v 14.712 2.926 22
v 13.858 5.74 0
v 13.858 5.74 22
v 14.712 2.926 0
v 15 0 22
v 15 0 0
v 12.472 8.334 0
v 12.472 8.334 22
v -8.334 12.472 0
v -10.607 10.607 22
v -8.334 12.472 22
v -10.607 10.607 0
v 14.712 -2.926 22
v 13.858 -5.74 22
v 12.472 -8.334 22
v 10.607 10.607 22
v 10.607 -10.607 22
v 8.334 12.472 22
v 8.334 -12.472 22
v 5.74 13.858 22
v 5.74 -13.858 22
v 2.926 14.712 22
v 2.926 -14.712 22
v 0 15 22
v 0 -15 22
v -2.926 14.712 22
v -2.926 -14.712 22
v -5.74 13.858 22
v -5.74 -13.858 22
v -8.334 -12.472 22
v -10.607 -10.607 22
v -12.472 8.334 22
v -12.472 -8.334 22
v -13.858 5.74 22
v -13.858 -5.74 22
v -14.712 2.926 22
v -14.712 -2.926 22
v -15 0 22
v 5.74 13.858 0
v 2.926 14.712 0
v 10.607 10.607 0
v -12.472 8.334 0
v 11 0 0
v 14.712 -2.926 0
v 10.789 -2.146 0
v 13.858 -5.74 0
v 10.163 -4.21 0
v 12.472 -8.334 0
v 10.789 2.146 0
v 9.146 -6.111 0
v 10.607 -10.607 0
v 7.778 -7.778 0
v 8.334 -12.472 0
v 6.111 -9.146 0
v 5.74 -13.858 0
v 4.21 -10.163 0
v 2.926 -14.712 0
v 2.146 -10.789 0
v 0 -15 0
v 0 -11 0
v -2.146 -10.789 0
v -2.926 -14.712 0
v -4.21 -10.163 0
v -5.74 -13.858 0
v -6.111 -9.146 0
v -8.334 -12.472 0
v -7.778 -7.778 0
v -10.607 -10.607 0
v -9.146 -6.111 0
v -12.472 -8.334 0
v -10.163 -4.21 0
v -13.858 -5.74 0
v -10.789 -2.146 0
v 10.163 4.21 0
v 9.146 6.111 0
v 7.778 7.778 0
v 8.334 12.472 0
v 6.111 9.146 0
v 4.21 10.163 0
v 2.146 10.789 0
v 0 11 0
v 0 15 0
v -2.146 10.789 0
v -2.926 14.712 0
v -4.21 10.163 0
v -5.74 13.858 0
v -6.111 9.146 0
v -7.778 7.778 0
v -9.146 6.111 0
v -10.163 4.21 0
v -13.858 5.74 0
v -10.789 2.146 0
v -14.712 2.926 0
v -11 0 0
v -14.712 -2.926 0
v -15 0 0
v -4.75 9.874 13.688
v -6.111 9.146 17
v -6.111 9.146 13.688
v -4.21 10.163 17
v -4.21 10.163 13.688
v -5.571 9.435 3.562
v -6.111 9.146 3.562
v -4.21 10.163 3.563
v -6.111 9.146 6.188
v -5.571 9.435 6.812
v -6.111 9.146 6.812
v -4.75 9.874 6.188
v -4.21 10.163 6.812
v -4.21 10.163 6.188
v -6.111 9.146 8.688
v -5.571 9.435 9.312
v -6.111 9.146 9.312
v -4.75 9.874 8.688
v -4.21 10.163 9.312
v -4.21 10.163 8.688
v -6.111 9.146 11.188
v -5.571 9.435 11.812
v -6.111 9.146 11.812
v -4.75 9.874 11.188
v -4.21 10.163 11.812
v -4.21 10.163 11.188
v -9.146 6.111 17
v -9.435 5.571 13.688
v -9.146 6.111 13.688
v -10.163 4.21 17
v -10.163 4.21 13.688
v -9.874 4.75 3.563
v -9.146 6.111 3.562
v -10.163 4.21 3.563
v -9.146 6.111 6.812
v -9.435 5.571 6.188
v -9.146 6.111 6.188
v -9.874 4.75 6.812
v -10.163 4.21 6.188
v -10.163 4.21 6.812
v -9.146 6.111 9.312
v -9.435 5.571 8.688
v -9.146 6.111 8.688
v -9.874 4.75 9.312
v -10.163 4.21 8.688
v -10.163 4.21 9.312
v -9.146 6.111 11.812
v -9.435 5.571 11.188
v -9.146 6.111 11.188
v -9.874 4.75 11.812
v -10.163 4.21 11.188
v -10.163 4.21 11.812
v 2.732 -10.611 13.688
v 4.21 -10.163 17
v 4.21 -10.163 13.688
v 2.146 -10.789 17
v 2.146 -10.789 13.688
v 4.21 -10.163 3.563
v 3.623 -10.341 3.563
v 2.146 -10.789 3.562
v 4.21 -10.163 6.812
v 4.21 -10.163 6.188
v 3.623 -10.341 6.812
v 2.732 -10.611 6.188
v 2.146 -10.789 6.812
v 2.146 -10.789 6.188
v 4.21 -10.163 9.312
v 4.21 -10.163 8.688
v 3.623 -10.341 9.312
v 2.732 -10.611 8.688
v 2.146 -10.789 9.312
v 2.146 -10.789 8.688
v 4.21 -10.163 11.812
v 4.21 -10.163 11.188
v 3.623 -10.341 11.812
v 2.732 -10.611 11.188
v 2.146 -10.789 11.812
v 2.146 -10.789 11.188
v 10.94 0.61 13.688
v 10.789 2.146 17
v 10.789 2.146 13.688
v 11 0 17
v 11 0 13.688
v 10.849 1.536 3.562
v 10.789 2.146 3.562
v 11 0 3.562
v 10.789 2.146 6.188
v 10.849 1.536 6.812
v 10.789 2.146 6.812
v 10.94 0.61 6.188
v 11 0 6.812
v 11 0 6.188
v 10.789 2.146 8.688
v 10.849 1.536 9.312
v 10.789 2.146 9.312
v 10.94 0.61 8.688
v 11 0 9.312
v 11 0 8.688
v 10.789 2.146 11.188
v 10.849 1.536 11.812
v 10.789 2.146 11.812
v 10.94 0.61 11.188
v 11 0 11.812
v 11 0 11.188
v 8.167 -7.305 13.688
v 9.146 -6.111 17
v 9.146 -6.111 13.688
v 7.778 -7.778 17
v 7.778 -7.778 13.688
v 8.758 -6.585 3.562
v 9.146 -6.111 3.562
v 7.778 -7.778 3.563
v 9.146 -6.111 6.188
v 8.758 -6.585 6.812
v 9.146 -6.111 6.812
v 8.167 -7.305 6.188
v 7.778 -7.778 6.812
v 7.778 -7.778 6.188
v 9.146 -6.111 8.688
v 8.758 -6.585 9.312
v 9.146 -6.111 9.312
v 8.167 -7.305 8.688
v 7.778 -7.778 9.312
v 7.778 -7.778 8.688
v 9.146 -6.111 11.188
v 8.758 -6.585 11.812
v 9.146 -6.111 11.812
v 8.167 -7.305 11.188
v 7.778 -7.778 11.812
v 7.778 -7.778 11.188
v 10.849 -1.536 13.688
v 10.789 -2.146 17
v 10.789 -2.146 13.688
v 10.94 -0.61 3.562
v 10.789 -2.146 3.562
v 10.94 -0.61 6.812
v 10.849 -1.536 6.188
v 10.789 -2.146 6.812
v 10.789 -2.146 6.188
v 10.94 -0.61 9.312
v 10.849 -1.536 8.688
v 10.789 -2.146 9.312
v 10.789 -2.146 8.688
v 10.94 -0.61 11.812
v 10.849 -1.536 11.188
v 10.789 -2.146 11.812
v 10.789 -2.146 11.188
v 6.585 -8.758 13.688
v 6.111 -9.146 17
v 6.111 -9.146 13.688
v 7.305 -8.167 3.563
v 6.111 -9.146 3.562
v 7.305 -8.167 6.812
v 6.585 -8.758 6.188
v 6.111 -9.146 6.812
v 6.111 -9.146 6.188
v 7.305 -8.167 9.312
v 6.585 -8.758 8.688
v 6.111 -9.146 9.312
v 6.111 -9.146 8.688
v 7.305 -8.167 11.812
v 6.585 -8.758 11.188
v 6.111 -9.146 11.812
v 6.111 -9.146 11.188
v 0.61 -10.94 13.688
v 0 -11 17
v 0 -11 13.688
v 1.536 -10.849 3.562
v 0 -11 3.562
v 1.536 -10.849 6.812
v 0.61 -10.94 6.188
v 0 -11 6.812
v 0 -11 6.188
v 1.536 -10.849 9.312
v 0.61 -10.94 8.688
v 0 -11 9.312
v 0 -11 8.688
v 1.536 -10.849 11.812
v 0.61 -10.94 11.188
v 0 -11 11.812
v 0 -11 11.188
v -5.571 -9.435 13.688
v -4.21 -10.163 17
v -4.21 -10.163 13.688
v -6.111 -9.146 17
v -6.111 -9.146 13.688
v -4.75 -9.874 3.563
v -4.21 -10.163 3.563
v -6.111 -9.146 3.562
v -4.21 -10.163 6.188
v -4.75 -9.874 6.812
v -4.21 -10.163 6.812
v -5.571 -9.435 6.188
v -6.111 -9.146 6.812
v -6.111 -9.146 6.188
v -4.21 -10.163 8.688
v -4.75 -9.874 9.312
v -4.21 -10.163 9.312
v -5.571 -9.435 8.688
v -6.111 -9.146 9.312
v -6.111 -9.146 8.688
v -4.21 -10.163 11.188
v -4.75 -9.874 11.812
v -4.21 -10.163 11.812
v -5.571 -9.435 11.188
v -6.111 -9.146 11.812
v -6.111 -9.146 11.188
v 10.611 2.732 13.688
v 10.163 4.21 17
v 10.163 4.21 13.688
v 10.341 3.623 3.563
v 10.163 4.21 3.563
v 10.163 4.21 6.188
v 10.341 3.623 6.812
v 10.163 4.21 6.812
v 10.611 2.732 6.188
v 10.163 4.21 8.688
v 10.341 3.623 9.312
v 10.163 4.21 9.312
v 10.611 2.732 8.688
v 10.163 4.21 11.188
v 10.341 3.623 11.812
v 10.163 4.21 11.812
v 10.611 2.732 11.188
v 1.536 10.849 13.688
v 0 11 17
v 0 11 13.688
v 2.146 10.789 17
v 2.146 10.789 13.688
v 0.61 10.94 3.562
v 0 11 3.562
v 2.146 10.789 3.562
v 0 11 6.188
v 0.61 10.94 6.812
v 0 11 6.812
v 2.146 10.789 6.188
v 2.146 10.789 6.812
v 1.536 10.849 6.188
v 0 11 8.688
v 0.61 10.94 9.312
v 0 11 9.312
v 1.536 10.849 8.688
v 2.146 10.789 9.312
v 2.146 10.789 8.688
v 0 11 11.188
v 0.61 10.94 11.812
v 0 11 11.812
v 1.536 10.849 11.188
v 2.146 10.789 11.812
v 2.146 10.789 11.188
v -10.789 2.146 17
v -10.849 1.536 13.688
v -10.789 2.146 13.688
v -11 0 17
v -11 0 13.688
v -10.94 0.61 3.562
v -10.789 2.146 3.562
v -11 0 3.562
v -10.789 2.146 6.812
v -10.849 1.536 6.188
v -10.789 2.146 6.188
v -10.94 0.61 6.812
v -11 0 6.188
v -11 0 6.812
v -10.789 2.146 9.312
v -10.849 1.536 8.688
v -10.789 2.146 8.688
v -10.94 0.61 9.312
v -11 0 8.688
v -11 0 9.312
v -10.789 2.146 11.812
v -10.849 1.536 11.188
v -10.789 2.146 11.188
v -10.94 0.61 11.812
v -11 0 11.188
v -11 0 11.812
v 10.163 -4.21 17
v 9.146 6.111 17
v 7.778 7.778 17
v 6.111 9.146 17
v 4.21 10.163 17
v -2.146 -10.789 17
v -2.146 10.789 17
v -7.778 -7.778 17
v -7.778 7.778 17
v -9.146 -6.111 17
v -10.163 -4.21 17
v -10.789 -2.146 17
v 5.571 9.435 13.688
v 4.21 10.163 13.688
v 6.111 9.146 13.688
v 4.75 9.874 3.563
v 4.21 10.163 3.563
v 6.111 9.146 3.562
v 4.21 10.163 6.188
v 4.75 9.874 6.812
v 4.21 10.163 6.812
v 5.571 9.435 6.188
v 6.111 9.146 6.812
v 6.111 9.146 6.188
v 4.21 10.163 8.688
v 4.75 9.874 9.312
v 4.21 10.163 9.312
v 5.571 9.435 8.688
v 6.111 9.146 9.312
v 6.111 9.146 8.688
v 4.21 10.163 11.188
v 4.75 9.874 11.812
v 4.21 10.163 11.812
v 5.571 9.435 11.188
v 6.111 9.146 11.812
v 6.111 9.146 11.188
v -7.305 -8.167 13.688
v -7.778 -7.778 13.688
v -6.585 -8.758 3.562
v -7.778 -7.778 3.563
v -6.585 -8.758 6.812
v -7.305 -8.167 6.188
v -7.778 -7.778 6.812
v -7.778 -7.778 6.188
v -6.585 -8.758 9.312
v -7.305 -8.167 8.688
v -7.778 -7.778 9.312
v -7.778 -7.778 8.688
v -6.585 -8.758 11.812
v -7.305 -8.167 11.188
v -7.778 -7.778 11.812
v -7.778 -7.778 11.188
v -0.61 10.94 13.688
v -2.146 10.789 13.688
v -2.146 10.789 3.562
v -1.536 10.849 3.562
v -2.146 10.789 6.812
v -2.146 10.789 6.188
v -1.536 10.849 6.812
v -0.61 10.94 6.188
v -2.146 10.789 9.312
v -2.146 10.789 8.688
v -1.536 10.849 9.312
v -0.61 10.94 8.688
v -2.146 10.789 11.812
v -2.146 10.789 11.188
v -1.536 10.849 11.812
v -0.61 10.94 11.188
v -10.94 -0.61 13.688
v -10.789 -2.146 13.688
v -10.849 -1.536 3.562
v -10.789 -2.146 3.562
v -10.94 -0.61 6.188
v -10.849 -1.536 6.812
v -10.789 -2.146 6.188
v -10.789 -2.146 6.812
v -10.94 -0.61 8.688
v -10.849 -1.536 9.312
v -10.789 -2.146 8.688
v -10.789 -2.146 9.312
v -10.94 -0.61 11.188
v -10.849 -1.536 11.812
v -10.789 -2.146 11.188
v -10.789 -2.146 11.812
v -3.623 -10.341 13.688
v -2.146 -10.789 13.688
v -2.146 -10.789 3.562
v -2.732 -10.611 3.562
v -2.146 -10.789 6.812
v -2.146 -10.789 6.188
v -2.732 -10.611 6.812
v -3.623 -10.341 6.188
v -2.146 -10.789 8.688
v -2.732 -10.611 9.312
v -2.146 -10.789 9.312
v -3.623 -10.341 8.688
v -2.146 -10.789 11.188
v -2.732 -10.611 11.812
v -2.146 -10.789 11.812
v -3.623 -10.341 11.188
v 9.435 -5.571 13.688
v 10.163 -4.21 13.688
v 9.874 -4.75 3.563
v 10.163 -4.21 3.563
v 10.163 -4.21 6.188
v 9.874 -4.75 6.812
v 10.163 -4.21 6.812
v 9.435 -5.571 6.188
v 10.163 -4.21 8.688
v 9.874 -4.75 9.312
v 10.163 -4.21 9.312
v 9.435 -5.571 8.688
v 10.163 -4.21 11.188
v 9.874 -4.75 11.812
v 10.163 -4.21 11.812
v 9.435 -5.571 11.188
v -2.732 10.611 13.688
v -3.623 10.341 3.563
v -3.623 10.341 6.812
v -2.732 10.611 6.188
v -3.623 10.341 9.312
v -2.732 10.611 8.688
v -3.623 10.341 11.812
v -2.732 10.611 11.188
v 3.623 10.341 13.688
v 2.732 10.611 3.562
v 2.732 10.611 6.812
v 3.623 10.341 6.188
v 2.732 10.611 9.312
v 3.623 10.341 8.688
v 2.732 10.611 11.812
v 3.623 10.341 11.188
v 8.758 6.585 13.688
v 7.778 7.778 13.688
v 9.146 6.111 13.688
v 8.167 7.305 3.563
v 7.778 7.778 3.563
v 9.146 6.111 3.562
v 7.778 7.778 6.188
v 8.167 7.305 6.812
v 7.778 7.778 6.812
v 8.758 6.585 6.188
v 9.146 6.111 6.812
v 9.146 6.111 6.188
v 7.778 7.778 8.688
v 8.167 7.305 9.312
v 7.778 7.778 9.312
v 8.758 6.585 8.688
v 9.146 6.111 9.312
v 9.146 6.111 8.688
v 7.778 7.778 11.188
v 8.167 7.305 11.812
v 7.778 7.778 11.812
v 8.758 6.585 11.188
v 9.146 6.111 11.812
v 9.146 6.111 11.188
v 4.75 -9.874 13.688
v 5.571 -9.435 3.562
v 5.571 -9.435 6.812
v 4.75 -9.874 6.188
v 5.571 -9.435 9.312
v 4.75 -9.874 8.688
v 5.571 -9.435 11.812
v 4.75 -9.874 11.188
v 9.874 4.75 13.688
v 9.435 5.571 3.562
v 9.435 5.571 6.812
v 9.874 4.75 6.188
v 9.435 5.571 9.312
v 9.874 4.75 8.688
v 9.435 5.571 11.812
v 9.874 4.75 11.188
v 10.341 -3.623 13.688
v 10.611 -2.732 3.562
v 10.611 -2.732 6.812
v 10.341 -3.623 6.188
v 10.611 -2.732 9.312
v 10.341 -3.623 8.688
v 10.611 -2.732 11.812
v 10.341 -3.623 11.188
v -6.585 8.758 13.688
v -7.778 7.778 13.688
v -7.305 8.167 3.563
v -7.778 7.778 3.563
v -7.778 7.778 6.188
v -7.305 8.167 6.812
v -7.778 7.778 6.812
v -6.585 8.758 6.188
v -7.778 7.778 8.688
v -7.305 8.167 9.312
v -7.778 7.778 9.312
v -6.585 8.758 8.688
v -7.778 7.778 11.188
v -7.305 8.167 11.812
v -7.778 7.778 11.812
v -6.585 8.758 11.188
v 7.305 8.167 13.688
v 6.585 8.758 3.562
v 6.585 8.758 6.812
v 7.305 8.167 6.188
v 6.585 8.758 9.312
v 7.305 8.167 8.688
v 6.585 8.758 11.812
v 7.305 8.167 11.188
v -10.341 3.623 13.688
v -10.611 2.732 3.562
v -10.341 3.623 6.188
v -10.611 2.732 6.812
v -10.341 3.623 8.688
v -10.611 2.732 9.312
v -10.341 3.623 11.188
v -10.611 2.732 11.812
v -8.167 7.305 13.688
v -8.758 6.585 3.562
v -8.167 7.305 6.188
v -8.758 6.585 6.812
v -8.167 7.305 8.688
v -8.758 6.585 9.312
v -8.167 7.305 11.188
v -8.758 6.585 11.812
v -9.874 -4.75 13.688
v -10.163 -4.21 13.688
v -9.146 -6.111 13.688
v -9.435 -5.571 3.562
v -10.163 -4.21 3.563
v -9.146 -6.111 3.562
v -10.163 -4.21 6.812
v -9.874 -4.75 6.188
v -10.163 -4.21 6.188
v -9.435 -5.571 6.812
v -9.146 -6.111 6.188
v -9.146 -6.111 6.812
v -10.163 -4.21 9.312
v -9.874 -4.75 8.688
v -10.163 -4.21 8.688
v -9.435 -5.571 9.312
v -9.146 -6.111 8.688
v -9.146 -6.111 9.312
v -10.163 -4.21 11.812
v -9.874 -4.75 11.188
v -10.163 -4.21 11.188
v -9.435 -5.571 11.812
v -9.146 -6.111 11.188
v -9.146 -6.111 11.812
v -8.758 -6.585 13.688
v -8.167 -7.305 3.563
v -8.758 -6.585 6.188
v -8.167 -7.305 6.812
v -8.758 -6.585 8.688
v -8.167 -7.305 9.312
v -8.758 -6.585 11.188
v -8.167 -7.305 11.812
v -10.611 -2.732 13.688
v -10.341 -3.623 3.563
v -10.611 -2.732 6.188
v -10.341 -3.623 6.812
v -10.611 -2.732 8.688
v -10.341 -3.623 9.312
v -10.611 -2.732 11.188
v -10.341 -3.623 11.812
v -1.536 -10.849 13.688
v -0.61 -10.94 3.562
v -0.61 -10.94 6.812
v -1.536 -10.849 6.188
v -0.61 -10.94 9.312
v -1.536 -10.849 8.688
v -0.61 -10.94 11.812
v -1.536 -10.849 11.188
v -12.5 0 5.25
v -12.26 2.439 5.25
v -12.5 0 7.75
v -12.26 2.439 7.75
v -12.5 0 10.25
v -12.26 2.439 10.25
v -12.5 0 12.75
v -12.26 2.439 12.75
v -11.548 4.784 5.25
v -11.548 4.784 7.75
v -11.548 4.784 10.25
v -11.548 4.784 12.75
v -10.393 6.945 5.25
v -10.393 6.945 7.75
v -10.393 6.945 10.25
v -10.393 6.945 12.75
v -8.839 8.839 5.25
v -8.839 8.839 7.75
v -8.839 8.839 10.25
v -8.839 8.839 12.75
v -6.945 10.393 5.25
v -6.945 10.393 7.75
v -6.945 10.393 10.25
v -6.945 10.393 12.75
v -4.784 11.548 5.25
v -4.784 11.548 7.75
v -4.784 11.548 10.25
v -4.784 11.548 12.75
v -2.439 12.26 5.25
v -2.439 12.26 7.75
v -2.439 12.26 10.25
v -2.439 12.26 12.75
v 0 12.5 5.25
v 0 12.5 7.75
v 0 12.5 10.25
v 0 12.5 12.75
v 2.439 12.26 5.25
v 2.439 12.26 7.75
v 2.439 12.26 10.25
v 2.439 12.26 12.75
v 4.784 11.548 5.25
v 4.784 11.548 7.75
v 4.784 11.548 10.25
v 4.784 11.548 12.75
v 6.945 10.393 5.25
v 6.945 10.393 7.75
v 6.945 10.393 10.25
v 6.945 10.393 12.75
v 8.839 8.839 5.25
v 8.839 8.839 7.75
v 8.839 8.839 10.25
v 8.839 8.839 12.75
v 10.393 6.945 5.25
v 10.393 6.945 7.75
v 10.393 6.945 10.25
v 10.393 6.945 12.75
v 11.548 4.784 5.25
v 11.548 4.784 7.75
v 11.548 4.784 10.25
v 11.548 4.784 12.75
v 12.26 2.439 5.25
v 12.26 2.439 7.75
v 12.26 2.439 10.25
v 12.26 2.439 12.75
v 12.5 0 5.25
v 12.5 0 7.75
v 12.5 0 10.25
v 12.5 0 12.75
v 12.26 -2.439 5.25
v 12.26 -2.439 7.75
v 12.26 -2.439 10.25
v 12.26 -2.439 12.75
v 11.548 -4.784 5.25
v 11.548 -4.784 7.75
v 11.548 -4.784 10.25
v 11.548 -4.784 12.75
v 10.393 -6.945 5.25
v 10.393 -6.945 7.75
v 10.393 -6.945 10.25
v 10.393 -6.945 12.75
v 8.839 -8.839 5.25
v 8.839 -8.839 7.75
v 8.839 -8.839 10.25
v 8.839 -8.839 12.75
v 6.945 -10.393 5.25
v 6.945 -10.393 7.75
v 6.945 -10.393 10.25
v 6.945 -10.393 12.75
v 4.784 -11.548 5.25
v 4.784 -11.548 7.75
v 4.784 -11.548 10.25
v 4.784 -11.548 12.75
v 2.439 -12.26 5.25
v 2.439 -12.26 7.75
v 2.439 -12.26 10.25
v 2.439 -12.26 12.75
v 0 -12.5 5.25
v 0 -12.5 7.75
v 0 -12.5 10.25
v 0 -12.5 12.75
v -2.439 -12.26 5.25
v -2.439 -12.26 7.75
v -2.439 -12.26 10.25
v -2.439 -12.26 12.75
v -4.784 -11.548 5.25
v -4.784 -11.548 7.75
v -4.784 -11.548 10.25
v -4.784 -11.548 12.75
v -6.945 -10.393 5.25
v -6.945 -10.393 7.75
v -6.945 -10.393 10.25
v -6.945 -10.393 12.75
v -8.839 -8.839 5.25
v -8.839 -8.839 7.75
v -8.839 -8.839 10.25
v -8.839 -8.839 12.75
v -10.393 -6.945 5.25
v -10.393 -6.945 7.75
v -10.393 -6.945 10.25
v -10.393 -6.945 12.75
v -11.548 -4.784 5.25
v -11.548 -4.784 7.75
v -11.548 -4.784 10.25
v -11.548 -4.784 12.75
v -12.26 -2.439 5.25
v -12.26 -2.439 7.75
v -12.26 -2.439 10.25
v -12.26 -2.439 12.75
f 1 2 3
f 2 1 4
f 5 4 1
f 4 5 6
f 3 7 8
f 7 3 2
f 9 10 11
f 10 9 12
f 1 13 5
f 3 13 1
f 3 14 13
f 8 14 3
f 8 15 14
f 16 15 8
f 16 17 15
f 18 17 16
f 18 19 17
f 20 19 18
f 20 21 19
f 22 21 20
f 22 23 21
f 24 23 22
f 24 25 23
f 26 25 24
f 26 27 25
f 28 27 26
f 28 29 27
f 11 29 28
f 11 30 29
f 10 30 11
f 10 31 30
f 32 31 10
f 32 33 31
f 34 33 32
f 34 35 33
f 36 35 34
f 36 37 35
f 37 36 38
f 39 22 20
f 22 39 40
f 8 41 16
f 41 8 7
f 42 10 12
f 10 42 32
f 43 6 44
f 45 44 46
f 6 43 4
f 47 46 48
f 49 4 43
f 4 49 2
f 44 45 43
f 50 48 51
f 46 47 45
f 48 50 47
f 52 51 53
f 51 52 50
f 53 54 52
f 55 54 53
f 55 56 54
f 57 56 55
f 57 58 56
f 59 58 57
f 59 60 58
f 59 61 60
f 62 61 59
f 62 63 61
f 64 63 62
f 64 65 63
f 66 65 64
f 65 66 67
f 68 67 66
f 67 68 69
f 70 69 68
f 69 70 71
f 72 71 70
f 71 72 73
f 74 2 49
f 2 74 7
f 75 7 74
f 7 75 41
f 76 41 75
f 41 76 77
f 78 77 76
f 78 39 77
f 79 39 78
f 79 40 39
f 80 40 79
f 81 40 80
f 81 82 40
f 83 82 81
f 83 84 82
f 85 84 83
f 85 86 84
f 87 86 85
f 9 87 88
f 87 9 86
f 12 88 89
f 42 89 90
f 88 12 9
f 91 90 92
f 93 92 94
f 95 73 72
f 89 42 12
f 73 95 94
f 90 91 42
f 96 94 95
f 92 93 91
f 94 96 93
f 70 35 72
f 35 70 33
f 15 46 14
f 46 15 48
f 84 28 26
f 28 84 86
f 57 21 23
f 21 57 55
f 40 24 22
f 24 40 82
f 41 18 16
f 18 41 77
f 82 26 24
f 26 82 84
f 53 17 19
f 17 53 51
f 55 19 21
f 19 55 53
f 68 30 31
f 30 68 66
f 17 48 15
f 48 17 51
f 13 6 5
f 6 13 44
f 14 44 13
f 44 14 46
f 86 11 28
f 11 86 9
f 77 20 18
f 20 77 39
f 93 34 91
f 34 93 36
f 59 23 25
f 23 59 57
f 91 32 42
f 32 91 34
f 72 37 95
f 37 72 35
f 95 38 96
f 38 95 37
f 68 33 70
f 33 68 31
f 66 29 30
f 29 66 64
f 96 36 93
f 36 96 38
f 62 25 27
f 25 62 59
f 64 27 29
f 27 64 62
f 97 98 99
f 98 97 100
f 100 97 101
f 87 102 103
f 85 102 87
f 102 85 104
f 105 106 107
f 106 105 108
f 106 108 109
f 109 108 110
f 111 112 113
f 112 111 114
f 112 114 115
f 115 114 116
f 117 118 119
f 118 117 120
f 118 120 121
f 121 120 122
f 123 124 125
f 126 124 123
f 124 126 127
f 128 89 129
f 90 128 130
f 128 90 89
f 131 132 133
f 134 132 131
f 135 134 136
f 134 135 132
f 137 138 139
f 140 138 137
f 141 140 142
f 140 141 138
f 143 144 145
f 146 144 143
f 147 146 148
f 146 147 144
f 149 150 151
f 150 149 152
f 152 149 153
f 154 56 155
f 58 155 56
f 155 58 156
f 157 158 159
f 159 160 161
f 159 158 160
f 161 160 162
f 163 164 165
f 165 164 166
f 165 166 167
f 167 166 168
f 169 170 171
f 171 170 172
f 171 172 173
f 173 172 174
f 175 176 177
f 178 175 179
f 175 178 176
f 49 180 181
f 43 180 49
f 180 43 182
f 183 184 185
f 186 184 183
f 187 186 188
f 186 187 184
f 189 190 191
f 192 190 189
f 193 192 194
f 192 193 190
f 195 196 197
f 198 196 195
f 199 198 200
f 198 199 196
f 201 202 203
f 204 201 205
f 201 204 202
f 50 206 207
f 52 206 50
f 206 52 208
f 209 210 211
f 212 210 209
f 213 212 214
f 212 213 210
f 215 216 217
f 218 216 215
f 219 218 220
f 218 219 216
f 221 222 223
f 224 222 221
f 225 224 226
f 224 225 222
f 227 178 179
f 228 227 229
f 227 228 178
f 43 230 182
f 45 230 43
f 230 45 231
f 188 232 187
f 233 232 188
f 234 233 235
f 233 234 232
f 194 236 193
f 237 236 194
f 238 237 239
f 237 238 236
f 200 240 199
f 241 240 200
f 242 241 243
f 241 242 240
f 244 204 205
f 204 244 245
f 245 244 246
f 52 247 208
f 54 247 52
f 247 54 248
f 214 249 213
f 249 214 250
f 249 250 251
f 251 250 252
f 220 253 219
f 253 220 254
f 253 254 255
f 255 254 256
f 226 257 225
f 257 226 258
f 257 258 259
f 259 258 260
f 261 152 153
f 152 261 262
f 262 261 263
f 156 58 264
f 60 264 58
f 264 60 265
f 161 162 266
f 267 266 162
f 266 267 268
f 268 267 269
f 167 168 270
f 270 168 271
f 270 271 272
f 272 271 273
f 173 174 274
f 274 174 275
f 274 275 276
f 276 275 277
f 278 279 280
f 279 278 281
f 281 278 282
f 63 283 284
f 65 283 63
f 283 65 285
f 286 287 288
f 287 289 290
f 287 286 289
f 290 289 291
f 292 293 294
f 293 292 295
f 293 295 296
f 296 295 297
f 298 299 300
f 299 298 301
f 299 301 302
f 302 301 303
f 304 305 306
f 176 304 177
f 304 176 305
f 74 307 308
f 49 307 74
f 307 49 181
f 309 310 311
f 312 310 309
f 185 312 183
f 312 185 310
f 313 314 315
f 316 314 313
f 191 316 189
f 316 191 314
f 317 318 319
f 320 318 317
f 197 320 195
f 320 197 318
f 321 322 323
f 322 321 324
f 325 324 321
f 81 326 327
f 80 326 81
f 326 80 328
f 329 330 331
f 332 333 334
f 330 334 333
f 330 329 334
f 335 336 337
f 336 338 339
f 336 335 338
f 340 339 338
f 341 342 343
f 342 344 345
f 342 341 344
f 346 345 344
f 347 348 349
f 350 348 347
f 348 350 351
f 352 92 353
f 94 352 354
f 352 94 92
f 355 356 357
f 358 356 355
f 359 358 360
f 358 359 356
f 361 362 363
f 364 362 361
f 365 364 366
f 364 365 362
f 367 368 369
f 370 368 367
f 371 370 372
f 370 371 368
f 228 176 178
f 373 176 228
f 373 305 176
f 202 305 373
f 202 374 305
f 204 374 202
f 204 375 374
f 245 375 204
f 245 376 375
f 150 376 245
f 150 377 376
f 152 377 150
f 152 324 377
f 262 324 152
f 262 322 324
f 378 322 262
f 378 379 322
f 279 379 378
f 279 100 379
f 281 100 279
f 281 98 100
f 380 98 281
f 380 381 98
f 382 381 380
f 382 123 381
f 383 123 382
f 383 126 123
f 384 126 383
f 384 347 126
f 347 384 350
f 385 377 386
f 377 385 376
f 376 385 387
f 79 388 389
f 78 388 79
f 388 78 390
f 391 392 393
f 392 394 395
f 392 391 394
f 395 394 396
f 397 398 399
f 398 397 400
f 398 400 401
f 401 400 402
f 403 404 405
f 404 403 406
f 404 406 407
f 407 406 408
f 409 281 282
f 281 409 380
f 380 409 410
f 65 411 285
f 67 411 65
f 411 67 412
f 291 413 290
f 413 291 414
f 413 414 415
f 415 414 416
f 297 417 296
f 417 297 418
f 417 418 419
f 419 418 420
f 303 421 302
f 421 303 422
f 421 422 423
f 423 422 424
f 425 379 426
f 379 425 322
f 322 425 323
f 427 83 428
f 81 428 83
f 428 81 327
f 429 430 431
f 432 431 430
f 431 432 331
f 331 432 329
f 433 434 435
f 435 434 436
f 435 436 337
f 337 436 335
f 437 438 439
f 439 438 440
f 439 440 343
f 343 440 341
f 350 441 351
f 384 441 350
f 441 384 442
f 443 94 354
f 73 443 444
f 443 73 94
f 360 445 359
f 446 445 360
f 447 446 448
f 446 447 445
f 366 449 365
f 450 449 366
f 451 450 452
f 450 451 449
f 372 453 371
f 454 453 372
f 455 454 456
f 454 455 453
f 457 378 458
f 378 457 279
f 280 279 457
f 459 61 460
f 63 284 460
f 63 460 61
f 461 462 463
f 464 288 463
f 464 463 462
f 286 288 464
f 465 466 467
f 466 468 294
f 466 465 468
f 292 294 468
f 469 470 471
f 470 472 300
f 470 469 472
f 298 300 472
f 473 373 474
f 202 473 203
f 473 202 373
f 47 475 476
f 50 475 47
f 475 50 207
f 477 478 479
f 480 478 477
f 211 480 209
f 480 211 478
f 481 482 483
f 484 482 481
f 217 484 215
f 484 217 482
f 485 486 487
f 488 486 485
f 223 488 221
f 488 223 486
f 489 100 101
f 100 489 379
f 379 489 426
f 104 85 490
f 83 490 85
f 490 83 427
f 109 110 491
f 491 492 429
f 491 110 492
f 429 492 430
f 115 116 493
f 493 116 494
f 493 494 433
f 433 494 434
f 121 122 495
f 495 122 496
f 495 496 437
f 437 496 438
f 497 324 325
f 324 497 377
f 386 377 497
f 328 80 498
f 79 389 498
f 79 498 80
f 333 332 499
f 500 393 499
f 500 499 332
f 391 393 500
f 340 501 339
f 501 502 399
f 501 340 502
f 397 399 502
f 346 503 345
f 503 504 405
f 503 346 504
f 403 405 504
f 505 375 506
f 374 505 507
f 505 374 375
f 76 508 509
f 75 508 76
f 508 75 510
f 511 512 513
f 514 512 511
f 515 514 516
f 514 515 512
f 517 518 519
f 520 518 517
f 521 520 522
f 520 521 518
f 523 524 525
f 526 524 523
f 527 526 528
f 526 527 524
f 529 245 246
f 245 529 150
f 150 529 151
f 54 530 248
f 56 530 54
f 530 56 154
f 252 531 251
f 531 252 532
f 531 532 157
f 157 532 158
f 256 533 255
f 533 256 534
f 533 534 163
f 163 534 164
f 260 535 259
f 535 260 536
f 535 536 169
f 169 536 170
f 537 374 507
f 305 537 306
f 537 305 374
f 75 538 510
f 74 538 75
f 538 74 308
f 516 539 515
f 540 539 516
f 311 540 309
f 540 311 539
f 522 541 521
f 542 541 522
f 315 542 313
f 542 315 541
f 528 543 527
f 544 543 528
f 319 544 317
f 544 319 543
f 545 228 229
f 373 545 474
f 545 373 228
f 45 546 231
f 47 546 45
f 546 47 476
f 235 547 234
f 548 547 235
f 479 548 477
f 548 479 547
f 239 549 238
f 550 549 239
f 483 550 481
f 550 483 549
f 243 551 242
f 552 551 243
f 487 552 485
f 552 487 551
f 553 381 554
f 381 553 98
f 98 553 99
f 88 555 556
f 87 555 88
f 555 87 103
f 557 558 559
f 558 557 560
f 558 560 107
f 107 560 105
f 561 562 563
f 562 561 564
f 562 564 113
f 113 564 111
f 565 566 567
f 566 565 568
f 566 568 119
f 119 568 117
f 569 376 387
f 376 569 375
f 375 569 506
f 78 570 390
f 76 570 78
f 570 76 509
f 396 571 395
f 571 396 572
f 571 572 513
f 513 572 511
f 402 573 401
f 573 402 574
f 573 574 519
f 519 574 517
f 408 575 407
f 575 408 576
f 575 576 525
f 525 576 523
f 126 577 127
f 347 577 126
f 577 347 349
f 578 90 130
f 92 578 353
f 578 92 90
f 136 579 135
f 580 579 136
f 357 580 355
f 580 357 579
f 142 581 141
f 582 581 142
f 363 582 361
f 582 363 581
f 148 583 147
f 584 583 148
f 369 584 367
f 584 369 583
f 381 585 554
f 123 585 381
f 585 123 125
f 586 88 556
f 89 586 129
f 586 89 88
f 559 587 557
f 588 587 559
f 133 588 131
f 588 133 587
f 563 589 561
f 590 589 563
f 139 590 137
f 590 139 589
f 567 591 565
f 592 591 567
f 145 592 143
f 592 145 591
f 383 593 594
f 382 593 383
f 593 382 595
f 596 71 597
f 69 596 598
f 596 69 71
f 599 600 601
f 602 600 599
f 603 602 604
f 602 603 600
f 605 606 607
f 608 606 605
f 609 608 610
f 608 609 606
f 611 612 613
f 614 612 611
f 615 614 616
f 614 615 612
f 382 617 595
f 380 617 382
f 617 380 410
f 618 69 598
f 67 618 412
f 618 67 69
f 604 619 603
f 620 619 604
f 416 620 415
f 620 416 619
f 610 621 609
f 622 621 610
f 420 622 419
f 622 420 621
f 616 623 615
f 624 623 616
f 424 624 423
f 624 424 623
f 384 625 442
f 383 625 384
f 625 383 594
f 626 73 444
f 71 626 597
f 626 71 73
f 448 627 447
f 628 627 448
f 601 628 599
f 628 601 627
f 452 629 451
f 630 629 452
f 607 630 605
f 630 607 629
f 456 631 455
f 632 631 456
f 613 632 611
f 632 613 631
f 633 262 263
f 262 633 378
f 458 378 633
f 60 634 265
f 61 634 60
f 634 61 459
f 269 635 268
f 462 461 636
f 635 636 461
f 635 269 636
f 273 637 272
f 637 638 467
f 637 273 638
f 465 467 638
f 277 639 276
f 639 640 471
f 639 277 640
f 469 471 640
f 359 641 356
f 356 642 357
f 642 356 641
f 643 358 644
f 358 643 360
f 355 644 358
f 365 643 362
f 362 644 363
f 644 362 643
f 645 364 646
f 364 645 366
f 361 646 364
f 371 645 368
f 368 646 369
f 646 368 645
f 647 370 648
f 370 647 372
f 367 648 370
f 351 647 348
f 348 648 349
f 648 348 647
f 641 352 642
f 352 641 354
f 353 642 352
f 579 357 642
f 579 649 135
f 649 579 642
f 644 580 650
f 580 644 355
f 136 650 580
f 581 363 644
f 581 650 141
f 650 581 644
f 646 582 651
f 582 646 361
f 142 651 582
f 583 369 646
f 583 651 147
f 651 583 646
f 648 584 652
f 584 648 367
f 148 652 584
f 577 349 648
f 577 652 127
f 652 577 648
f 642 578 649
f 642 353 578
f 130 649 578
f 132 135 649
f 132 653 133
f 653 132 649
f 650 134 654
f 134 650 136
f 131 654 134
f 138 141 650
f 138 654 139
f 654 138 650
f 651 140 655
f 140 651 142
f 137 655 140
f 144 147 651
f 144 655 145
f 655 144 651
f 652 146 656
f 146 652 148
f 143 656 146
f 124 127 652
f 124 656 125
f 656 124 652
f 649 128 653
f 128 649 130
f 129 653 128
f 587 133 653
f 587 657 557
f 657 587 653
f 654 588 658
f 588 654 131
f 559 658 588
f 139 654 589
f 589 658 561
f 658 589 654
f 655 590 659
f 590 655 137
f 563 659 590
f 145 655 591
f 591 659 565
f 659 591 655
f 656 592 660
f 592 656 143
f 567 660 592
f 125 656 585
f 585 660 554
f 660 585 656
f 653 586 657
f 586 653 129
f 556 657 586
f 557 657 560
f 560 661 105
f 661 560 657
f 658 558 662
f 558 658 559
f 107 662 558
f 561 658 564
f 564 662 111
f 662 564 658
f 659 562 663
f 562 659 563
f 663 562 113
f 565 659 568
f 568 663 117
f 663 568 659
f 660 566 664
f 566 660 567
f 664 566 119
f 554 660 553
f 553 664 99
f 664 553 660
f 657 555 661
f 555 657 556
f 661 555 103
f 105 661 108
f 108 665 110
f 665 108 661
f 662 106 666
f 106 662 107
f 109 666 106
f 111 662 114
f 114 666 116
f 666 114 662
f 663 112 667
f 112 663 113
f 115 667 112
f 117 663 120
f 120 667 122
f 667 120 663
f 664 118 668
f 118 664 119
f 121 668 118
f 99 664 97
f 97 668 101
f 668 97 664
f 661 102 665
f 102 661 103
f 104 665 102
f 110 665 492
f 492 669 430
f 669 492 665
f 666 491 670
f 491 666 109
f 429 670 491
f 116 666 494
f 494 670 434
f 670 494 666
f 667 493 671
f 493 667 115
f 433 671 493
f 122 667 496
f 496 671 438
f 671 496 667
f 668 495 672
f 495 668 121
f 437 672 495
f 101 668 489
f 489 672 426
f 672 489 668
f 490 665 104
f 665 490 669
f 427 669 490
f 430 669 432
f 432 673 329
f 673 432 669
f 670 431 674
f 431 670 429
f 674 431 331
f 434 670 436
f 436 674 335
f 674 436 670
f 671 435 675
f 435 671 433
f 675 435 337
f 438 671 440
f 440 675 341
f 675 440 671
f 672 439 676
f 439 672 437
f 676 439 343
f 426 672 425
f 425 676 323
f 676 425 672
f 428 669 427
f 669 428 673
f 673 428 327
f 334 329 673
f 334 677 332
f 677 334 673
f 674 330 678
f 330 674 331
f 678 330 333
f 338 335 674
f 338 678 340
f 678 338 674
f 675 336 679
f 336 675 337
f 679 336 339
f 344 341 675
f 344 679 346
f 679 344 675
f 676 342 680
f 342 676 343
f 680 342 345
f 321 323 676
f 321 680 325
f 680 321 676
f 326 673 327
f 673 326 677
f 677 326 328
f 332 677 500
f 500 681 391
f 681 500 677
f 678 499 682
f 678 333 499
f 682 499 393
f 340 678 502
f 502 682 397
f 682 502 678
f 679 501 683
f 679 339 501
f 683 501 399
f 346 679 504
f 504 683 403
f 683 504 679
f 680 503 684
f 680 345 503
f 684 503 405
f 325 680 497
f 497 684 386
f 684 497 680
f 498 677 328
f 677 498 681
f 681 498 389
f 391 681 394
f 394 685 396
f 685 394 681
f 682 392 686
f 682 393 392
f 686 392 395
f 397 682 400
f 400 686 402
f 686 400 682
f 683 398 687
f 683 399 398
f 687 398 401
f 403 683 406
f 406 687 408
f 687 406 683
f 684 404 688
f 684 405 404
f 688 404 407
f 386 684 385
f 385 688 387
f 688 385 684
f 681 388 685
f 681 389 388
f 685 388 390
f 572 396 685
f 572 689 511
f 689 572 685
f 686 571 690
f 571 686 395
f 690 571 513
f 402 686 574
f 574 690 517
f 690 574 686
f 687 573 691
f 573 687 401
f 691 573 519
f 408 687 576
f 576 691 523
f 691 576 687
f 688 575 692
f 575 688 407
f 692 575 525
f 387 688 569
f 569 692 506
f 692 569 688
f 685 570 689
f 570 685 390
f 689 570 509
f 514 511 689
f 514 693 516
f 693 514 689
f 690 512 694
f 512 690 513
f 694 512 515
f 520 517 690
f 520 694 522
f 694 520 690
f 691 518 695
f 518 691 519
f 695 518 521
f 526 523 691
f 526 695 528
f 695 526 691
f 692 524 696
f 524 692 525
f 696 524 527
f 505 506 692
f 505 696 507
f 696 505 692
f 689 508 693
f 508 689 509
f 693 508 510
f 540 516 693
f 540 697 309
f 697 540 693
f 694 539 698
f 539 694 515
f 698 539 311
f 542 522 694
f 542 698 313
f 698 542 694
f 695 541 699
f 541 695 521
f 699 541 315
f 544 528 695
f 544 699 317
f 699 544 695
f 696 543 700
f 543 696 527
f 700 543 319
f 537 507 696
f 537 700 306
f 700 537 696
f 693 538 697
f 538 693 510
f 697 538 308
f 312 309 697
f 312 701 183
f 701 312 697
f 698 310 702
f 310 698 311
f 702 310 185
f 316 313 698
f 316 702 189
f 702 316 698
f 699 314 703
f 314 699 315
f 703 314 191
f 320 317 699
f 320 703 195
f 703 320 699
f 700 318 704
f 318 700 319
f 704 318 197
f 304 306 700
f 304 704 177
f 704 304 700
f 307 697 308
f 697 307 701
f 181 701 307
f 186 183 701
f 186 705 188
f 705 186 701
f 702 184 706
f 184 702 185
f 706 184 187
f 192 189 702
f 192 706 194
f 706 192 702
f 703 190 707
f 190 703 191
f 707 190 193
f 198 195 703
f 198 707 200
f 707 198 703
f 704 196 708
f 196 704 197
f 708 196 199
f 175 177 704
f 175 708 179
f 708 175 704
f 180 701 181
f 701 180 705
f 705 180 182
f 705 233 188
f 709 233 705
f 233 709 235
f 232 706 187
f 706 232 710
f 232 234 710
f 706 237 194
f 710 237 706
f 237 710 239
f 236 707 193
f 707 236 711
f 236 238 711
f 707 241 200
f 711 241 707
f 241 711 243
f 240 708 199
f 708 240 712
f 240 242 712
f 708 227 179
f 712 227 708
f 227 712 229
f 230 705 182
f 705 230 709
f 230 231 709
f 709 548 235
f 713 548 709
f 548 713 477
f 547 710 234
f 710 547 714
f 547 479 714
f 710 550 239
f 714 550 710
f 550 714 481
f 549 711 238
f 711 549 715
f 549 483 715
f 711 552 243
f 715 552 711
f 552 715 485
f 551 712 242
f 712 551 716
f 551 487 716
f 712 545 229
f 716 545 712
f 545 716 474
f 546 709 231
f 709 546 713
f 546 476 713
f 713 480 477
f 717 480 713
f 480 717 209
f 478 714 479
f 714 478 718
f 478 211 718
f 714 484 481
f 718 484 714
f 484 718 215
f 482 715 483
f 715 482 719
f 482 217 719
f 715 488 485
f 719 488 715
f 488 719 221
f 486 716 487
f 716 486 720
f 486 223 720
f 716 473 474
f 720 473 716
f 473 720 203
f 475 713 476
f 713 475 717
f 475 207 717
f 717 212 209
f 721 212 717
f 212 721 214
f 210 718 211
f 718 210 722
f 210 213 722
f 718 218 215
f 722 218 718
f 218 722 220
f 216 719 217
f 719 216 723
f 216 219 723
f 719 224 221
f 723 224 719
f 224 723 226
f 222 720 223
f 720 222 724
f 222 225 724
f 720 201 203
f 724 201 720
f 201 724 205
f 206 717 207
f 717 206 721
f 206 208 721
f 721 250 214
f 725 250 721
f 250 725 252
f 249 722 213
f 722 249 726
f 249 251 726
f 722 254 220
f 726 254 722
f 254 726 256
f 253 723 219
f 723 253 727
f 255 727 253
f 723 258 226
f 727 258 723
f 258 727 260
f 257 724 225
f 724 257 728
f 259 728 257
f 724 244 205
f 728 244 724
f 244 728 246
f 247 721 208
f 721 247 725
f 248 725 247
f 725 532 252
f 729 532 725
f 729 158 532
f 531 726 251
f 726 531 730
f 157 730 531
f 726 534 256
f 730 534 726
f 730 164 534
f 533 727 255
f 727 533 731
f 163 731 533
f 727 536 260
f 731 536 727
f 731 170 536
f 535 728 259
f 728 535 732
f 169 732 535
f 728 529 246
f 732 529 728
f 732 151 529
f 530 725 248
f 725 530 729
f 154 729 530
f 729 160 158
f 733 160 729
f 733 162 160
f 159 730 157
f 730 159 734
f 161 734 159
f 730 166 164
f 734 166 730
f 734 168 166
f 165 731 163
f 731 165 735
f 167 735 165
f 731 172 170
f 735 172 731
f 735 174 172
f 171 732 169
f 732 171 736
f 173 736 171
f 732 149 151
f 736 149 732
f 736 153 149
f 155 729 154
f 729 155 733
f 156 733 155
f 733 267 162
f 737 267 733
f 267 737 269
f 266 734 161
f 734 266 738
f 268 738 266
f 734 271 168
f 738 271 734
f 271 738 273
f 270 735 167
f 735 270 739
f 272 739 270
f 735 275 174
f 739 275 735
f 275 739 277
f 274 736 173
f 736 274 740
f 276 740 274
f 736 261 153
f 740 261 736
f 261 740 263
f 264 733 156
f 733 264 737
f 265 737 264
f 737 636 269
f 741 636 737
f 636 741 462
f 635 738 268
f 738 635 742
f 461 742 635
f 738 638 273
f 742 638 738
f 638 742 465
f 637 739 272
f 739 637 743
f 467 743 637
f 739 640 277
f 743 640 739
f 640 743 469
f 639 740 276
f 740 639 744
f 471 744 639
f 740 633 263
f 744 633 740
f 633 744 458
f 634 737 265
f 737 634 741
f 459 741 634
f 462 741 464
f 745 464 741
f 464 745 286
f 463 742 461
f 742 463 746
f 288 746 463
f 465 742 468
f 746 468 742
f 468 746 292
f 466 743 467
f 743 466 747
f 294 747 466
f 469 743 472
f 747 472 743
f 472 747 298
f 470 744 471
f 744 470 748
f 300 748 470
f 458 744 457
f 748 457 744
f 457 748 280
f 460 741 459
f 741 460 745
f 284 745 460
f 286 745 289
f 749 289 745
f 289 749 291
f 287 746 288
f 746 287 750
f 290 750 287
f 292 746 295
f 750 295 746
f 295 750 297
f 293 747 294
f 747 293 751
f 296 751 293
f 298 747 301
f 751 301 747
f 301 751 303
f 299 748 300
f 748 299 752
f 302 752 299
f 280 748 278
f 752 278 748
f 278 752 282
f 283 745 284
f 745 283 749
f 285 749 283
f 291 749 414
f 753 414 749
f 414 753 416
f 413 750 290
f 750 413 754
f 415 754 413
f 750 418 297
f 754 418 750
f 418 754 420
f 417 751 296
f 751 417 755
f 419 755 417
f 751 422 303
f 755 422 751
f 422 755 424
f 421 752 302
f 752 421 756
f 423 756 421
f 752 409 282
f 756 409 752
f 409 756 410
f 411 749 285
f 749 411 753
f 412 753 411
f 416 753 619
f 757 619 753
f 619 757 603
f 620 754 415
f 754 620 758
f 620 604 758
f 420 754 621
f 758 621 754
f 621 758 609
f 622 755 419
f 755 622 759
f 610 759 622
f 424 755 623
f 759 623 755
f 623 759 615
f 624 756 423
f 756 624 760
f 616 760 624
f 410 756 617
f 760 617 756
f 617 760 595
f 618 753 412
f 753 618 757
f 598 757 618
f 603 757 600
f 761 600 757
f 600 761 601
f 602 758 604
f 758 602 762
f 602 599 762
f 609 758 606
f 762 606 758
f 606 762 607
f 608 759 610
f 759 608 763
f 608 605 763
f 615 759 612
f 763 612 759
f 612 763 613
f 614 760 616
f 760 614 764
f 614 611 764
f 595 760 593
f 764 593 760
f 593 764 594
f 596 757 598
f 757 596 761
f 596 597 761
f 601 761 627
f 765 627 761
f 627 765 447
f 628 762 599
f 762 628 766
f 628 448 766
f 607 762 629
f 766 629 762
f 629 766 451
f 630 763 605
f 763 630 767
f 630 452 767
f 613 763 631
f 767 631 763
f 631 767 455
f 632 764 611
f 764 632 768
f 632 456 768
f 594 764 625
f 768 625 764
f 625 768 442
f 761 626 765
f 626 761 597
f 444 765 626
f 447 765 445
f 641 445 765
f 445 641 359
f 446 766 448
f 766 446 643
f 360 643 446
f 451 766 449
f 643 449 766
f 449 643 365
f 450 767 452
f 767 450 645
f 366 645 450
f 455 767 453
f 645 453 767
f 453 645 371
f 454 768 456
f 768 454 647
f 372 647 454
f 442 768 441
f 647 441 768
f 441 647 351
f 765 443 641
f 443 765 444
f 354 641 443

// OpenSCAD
$fn = 32;

// ----------------------------------------------------------------------
// Threaded cap: 30 mm body, 22 mm tall, 22 mm threaded bore
// ----------------------------------------------------------------------

// --- parameters (mm) ---
outer_d = 30;             // cap outside diameter
body_h = 22;              // cap height
top_t = 5;                // closed top thickness
bore_d = 22;              // bore core diameter
pitch = 2.5;              // thread pitch
thread_d = 1.5;           // thread depth
thread_z = 3;             // thread start above the rim
thread_h = 11;            // threaded height

difference() {
  union() {
    cylinder(h = 22, d = outer_d);
  }
  /* threaded bore, closed at the top */
  translate([0, 0, -2.5]) cylinder(h = 19.5, d = bore_d);
  translate([0, 0, 3]) rotate_extrude() polygon([[10, 0], [10, 11], [10.5, 11], [12.5, 9.75], [10.5, 8.5], [12.5, 7.25], [10.5, 6], [12.5, 4.75], [10.5, 3.5], [12.5, 2.25], [10.5, 0], [10, 0]]);
}
